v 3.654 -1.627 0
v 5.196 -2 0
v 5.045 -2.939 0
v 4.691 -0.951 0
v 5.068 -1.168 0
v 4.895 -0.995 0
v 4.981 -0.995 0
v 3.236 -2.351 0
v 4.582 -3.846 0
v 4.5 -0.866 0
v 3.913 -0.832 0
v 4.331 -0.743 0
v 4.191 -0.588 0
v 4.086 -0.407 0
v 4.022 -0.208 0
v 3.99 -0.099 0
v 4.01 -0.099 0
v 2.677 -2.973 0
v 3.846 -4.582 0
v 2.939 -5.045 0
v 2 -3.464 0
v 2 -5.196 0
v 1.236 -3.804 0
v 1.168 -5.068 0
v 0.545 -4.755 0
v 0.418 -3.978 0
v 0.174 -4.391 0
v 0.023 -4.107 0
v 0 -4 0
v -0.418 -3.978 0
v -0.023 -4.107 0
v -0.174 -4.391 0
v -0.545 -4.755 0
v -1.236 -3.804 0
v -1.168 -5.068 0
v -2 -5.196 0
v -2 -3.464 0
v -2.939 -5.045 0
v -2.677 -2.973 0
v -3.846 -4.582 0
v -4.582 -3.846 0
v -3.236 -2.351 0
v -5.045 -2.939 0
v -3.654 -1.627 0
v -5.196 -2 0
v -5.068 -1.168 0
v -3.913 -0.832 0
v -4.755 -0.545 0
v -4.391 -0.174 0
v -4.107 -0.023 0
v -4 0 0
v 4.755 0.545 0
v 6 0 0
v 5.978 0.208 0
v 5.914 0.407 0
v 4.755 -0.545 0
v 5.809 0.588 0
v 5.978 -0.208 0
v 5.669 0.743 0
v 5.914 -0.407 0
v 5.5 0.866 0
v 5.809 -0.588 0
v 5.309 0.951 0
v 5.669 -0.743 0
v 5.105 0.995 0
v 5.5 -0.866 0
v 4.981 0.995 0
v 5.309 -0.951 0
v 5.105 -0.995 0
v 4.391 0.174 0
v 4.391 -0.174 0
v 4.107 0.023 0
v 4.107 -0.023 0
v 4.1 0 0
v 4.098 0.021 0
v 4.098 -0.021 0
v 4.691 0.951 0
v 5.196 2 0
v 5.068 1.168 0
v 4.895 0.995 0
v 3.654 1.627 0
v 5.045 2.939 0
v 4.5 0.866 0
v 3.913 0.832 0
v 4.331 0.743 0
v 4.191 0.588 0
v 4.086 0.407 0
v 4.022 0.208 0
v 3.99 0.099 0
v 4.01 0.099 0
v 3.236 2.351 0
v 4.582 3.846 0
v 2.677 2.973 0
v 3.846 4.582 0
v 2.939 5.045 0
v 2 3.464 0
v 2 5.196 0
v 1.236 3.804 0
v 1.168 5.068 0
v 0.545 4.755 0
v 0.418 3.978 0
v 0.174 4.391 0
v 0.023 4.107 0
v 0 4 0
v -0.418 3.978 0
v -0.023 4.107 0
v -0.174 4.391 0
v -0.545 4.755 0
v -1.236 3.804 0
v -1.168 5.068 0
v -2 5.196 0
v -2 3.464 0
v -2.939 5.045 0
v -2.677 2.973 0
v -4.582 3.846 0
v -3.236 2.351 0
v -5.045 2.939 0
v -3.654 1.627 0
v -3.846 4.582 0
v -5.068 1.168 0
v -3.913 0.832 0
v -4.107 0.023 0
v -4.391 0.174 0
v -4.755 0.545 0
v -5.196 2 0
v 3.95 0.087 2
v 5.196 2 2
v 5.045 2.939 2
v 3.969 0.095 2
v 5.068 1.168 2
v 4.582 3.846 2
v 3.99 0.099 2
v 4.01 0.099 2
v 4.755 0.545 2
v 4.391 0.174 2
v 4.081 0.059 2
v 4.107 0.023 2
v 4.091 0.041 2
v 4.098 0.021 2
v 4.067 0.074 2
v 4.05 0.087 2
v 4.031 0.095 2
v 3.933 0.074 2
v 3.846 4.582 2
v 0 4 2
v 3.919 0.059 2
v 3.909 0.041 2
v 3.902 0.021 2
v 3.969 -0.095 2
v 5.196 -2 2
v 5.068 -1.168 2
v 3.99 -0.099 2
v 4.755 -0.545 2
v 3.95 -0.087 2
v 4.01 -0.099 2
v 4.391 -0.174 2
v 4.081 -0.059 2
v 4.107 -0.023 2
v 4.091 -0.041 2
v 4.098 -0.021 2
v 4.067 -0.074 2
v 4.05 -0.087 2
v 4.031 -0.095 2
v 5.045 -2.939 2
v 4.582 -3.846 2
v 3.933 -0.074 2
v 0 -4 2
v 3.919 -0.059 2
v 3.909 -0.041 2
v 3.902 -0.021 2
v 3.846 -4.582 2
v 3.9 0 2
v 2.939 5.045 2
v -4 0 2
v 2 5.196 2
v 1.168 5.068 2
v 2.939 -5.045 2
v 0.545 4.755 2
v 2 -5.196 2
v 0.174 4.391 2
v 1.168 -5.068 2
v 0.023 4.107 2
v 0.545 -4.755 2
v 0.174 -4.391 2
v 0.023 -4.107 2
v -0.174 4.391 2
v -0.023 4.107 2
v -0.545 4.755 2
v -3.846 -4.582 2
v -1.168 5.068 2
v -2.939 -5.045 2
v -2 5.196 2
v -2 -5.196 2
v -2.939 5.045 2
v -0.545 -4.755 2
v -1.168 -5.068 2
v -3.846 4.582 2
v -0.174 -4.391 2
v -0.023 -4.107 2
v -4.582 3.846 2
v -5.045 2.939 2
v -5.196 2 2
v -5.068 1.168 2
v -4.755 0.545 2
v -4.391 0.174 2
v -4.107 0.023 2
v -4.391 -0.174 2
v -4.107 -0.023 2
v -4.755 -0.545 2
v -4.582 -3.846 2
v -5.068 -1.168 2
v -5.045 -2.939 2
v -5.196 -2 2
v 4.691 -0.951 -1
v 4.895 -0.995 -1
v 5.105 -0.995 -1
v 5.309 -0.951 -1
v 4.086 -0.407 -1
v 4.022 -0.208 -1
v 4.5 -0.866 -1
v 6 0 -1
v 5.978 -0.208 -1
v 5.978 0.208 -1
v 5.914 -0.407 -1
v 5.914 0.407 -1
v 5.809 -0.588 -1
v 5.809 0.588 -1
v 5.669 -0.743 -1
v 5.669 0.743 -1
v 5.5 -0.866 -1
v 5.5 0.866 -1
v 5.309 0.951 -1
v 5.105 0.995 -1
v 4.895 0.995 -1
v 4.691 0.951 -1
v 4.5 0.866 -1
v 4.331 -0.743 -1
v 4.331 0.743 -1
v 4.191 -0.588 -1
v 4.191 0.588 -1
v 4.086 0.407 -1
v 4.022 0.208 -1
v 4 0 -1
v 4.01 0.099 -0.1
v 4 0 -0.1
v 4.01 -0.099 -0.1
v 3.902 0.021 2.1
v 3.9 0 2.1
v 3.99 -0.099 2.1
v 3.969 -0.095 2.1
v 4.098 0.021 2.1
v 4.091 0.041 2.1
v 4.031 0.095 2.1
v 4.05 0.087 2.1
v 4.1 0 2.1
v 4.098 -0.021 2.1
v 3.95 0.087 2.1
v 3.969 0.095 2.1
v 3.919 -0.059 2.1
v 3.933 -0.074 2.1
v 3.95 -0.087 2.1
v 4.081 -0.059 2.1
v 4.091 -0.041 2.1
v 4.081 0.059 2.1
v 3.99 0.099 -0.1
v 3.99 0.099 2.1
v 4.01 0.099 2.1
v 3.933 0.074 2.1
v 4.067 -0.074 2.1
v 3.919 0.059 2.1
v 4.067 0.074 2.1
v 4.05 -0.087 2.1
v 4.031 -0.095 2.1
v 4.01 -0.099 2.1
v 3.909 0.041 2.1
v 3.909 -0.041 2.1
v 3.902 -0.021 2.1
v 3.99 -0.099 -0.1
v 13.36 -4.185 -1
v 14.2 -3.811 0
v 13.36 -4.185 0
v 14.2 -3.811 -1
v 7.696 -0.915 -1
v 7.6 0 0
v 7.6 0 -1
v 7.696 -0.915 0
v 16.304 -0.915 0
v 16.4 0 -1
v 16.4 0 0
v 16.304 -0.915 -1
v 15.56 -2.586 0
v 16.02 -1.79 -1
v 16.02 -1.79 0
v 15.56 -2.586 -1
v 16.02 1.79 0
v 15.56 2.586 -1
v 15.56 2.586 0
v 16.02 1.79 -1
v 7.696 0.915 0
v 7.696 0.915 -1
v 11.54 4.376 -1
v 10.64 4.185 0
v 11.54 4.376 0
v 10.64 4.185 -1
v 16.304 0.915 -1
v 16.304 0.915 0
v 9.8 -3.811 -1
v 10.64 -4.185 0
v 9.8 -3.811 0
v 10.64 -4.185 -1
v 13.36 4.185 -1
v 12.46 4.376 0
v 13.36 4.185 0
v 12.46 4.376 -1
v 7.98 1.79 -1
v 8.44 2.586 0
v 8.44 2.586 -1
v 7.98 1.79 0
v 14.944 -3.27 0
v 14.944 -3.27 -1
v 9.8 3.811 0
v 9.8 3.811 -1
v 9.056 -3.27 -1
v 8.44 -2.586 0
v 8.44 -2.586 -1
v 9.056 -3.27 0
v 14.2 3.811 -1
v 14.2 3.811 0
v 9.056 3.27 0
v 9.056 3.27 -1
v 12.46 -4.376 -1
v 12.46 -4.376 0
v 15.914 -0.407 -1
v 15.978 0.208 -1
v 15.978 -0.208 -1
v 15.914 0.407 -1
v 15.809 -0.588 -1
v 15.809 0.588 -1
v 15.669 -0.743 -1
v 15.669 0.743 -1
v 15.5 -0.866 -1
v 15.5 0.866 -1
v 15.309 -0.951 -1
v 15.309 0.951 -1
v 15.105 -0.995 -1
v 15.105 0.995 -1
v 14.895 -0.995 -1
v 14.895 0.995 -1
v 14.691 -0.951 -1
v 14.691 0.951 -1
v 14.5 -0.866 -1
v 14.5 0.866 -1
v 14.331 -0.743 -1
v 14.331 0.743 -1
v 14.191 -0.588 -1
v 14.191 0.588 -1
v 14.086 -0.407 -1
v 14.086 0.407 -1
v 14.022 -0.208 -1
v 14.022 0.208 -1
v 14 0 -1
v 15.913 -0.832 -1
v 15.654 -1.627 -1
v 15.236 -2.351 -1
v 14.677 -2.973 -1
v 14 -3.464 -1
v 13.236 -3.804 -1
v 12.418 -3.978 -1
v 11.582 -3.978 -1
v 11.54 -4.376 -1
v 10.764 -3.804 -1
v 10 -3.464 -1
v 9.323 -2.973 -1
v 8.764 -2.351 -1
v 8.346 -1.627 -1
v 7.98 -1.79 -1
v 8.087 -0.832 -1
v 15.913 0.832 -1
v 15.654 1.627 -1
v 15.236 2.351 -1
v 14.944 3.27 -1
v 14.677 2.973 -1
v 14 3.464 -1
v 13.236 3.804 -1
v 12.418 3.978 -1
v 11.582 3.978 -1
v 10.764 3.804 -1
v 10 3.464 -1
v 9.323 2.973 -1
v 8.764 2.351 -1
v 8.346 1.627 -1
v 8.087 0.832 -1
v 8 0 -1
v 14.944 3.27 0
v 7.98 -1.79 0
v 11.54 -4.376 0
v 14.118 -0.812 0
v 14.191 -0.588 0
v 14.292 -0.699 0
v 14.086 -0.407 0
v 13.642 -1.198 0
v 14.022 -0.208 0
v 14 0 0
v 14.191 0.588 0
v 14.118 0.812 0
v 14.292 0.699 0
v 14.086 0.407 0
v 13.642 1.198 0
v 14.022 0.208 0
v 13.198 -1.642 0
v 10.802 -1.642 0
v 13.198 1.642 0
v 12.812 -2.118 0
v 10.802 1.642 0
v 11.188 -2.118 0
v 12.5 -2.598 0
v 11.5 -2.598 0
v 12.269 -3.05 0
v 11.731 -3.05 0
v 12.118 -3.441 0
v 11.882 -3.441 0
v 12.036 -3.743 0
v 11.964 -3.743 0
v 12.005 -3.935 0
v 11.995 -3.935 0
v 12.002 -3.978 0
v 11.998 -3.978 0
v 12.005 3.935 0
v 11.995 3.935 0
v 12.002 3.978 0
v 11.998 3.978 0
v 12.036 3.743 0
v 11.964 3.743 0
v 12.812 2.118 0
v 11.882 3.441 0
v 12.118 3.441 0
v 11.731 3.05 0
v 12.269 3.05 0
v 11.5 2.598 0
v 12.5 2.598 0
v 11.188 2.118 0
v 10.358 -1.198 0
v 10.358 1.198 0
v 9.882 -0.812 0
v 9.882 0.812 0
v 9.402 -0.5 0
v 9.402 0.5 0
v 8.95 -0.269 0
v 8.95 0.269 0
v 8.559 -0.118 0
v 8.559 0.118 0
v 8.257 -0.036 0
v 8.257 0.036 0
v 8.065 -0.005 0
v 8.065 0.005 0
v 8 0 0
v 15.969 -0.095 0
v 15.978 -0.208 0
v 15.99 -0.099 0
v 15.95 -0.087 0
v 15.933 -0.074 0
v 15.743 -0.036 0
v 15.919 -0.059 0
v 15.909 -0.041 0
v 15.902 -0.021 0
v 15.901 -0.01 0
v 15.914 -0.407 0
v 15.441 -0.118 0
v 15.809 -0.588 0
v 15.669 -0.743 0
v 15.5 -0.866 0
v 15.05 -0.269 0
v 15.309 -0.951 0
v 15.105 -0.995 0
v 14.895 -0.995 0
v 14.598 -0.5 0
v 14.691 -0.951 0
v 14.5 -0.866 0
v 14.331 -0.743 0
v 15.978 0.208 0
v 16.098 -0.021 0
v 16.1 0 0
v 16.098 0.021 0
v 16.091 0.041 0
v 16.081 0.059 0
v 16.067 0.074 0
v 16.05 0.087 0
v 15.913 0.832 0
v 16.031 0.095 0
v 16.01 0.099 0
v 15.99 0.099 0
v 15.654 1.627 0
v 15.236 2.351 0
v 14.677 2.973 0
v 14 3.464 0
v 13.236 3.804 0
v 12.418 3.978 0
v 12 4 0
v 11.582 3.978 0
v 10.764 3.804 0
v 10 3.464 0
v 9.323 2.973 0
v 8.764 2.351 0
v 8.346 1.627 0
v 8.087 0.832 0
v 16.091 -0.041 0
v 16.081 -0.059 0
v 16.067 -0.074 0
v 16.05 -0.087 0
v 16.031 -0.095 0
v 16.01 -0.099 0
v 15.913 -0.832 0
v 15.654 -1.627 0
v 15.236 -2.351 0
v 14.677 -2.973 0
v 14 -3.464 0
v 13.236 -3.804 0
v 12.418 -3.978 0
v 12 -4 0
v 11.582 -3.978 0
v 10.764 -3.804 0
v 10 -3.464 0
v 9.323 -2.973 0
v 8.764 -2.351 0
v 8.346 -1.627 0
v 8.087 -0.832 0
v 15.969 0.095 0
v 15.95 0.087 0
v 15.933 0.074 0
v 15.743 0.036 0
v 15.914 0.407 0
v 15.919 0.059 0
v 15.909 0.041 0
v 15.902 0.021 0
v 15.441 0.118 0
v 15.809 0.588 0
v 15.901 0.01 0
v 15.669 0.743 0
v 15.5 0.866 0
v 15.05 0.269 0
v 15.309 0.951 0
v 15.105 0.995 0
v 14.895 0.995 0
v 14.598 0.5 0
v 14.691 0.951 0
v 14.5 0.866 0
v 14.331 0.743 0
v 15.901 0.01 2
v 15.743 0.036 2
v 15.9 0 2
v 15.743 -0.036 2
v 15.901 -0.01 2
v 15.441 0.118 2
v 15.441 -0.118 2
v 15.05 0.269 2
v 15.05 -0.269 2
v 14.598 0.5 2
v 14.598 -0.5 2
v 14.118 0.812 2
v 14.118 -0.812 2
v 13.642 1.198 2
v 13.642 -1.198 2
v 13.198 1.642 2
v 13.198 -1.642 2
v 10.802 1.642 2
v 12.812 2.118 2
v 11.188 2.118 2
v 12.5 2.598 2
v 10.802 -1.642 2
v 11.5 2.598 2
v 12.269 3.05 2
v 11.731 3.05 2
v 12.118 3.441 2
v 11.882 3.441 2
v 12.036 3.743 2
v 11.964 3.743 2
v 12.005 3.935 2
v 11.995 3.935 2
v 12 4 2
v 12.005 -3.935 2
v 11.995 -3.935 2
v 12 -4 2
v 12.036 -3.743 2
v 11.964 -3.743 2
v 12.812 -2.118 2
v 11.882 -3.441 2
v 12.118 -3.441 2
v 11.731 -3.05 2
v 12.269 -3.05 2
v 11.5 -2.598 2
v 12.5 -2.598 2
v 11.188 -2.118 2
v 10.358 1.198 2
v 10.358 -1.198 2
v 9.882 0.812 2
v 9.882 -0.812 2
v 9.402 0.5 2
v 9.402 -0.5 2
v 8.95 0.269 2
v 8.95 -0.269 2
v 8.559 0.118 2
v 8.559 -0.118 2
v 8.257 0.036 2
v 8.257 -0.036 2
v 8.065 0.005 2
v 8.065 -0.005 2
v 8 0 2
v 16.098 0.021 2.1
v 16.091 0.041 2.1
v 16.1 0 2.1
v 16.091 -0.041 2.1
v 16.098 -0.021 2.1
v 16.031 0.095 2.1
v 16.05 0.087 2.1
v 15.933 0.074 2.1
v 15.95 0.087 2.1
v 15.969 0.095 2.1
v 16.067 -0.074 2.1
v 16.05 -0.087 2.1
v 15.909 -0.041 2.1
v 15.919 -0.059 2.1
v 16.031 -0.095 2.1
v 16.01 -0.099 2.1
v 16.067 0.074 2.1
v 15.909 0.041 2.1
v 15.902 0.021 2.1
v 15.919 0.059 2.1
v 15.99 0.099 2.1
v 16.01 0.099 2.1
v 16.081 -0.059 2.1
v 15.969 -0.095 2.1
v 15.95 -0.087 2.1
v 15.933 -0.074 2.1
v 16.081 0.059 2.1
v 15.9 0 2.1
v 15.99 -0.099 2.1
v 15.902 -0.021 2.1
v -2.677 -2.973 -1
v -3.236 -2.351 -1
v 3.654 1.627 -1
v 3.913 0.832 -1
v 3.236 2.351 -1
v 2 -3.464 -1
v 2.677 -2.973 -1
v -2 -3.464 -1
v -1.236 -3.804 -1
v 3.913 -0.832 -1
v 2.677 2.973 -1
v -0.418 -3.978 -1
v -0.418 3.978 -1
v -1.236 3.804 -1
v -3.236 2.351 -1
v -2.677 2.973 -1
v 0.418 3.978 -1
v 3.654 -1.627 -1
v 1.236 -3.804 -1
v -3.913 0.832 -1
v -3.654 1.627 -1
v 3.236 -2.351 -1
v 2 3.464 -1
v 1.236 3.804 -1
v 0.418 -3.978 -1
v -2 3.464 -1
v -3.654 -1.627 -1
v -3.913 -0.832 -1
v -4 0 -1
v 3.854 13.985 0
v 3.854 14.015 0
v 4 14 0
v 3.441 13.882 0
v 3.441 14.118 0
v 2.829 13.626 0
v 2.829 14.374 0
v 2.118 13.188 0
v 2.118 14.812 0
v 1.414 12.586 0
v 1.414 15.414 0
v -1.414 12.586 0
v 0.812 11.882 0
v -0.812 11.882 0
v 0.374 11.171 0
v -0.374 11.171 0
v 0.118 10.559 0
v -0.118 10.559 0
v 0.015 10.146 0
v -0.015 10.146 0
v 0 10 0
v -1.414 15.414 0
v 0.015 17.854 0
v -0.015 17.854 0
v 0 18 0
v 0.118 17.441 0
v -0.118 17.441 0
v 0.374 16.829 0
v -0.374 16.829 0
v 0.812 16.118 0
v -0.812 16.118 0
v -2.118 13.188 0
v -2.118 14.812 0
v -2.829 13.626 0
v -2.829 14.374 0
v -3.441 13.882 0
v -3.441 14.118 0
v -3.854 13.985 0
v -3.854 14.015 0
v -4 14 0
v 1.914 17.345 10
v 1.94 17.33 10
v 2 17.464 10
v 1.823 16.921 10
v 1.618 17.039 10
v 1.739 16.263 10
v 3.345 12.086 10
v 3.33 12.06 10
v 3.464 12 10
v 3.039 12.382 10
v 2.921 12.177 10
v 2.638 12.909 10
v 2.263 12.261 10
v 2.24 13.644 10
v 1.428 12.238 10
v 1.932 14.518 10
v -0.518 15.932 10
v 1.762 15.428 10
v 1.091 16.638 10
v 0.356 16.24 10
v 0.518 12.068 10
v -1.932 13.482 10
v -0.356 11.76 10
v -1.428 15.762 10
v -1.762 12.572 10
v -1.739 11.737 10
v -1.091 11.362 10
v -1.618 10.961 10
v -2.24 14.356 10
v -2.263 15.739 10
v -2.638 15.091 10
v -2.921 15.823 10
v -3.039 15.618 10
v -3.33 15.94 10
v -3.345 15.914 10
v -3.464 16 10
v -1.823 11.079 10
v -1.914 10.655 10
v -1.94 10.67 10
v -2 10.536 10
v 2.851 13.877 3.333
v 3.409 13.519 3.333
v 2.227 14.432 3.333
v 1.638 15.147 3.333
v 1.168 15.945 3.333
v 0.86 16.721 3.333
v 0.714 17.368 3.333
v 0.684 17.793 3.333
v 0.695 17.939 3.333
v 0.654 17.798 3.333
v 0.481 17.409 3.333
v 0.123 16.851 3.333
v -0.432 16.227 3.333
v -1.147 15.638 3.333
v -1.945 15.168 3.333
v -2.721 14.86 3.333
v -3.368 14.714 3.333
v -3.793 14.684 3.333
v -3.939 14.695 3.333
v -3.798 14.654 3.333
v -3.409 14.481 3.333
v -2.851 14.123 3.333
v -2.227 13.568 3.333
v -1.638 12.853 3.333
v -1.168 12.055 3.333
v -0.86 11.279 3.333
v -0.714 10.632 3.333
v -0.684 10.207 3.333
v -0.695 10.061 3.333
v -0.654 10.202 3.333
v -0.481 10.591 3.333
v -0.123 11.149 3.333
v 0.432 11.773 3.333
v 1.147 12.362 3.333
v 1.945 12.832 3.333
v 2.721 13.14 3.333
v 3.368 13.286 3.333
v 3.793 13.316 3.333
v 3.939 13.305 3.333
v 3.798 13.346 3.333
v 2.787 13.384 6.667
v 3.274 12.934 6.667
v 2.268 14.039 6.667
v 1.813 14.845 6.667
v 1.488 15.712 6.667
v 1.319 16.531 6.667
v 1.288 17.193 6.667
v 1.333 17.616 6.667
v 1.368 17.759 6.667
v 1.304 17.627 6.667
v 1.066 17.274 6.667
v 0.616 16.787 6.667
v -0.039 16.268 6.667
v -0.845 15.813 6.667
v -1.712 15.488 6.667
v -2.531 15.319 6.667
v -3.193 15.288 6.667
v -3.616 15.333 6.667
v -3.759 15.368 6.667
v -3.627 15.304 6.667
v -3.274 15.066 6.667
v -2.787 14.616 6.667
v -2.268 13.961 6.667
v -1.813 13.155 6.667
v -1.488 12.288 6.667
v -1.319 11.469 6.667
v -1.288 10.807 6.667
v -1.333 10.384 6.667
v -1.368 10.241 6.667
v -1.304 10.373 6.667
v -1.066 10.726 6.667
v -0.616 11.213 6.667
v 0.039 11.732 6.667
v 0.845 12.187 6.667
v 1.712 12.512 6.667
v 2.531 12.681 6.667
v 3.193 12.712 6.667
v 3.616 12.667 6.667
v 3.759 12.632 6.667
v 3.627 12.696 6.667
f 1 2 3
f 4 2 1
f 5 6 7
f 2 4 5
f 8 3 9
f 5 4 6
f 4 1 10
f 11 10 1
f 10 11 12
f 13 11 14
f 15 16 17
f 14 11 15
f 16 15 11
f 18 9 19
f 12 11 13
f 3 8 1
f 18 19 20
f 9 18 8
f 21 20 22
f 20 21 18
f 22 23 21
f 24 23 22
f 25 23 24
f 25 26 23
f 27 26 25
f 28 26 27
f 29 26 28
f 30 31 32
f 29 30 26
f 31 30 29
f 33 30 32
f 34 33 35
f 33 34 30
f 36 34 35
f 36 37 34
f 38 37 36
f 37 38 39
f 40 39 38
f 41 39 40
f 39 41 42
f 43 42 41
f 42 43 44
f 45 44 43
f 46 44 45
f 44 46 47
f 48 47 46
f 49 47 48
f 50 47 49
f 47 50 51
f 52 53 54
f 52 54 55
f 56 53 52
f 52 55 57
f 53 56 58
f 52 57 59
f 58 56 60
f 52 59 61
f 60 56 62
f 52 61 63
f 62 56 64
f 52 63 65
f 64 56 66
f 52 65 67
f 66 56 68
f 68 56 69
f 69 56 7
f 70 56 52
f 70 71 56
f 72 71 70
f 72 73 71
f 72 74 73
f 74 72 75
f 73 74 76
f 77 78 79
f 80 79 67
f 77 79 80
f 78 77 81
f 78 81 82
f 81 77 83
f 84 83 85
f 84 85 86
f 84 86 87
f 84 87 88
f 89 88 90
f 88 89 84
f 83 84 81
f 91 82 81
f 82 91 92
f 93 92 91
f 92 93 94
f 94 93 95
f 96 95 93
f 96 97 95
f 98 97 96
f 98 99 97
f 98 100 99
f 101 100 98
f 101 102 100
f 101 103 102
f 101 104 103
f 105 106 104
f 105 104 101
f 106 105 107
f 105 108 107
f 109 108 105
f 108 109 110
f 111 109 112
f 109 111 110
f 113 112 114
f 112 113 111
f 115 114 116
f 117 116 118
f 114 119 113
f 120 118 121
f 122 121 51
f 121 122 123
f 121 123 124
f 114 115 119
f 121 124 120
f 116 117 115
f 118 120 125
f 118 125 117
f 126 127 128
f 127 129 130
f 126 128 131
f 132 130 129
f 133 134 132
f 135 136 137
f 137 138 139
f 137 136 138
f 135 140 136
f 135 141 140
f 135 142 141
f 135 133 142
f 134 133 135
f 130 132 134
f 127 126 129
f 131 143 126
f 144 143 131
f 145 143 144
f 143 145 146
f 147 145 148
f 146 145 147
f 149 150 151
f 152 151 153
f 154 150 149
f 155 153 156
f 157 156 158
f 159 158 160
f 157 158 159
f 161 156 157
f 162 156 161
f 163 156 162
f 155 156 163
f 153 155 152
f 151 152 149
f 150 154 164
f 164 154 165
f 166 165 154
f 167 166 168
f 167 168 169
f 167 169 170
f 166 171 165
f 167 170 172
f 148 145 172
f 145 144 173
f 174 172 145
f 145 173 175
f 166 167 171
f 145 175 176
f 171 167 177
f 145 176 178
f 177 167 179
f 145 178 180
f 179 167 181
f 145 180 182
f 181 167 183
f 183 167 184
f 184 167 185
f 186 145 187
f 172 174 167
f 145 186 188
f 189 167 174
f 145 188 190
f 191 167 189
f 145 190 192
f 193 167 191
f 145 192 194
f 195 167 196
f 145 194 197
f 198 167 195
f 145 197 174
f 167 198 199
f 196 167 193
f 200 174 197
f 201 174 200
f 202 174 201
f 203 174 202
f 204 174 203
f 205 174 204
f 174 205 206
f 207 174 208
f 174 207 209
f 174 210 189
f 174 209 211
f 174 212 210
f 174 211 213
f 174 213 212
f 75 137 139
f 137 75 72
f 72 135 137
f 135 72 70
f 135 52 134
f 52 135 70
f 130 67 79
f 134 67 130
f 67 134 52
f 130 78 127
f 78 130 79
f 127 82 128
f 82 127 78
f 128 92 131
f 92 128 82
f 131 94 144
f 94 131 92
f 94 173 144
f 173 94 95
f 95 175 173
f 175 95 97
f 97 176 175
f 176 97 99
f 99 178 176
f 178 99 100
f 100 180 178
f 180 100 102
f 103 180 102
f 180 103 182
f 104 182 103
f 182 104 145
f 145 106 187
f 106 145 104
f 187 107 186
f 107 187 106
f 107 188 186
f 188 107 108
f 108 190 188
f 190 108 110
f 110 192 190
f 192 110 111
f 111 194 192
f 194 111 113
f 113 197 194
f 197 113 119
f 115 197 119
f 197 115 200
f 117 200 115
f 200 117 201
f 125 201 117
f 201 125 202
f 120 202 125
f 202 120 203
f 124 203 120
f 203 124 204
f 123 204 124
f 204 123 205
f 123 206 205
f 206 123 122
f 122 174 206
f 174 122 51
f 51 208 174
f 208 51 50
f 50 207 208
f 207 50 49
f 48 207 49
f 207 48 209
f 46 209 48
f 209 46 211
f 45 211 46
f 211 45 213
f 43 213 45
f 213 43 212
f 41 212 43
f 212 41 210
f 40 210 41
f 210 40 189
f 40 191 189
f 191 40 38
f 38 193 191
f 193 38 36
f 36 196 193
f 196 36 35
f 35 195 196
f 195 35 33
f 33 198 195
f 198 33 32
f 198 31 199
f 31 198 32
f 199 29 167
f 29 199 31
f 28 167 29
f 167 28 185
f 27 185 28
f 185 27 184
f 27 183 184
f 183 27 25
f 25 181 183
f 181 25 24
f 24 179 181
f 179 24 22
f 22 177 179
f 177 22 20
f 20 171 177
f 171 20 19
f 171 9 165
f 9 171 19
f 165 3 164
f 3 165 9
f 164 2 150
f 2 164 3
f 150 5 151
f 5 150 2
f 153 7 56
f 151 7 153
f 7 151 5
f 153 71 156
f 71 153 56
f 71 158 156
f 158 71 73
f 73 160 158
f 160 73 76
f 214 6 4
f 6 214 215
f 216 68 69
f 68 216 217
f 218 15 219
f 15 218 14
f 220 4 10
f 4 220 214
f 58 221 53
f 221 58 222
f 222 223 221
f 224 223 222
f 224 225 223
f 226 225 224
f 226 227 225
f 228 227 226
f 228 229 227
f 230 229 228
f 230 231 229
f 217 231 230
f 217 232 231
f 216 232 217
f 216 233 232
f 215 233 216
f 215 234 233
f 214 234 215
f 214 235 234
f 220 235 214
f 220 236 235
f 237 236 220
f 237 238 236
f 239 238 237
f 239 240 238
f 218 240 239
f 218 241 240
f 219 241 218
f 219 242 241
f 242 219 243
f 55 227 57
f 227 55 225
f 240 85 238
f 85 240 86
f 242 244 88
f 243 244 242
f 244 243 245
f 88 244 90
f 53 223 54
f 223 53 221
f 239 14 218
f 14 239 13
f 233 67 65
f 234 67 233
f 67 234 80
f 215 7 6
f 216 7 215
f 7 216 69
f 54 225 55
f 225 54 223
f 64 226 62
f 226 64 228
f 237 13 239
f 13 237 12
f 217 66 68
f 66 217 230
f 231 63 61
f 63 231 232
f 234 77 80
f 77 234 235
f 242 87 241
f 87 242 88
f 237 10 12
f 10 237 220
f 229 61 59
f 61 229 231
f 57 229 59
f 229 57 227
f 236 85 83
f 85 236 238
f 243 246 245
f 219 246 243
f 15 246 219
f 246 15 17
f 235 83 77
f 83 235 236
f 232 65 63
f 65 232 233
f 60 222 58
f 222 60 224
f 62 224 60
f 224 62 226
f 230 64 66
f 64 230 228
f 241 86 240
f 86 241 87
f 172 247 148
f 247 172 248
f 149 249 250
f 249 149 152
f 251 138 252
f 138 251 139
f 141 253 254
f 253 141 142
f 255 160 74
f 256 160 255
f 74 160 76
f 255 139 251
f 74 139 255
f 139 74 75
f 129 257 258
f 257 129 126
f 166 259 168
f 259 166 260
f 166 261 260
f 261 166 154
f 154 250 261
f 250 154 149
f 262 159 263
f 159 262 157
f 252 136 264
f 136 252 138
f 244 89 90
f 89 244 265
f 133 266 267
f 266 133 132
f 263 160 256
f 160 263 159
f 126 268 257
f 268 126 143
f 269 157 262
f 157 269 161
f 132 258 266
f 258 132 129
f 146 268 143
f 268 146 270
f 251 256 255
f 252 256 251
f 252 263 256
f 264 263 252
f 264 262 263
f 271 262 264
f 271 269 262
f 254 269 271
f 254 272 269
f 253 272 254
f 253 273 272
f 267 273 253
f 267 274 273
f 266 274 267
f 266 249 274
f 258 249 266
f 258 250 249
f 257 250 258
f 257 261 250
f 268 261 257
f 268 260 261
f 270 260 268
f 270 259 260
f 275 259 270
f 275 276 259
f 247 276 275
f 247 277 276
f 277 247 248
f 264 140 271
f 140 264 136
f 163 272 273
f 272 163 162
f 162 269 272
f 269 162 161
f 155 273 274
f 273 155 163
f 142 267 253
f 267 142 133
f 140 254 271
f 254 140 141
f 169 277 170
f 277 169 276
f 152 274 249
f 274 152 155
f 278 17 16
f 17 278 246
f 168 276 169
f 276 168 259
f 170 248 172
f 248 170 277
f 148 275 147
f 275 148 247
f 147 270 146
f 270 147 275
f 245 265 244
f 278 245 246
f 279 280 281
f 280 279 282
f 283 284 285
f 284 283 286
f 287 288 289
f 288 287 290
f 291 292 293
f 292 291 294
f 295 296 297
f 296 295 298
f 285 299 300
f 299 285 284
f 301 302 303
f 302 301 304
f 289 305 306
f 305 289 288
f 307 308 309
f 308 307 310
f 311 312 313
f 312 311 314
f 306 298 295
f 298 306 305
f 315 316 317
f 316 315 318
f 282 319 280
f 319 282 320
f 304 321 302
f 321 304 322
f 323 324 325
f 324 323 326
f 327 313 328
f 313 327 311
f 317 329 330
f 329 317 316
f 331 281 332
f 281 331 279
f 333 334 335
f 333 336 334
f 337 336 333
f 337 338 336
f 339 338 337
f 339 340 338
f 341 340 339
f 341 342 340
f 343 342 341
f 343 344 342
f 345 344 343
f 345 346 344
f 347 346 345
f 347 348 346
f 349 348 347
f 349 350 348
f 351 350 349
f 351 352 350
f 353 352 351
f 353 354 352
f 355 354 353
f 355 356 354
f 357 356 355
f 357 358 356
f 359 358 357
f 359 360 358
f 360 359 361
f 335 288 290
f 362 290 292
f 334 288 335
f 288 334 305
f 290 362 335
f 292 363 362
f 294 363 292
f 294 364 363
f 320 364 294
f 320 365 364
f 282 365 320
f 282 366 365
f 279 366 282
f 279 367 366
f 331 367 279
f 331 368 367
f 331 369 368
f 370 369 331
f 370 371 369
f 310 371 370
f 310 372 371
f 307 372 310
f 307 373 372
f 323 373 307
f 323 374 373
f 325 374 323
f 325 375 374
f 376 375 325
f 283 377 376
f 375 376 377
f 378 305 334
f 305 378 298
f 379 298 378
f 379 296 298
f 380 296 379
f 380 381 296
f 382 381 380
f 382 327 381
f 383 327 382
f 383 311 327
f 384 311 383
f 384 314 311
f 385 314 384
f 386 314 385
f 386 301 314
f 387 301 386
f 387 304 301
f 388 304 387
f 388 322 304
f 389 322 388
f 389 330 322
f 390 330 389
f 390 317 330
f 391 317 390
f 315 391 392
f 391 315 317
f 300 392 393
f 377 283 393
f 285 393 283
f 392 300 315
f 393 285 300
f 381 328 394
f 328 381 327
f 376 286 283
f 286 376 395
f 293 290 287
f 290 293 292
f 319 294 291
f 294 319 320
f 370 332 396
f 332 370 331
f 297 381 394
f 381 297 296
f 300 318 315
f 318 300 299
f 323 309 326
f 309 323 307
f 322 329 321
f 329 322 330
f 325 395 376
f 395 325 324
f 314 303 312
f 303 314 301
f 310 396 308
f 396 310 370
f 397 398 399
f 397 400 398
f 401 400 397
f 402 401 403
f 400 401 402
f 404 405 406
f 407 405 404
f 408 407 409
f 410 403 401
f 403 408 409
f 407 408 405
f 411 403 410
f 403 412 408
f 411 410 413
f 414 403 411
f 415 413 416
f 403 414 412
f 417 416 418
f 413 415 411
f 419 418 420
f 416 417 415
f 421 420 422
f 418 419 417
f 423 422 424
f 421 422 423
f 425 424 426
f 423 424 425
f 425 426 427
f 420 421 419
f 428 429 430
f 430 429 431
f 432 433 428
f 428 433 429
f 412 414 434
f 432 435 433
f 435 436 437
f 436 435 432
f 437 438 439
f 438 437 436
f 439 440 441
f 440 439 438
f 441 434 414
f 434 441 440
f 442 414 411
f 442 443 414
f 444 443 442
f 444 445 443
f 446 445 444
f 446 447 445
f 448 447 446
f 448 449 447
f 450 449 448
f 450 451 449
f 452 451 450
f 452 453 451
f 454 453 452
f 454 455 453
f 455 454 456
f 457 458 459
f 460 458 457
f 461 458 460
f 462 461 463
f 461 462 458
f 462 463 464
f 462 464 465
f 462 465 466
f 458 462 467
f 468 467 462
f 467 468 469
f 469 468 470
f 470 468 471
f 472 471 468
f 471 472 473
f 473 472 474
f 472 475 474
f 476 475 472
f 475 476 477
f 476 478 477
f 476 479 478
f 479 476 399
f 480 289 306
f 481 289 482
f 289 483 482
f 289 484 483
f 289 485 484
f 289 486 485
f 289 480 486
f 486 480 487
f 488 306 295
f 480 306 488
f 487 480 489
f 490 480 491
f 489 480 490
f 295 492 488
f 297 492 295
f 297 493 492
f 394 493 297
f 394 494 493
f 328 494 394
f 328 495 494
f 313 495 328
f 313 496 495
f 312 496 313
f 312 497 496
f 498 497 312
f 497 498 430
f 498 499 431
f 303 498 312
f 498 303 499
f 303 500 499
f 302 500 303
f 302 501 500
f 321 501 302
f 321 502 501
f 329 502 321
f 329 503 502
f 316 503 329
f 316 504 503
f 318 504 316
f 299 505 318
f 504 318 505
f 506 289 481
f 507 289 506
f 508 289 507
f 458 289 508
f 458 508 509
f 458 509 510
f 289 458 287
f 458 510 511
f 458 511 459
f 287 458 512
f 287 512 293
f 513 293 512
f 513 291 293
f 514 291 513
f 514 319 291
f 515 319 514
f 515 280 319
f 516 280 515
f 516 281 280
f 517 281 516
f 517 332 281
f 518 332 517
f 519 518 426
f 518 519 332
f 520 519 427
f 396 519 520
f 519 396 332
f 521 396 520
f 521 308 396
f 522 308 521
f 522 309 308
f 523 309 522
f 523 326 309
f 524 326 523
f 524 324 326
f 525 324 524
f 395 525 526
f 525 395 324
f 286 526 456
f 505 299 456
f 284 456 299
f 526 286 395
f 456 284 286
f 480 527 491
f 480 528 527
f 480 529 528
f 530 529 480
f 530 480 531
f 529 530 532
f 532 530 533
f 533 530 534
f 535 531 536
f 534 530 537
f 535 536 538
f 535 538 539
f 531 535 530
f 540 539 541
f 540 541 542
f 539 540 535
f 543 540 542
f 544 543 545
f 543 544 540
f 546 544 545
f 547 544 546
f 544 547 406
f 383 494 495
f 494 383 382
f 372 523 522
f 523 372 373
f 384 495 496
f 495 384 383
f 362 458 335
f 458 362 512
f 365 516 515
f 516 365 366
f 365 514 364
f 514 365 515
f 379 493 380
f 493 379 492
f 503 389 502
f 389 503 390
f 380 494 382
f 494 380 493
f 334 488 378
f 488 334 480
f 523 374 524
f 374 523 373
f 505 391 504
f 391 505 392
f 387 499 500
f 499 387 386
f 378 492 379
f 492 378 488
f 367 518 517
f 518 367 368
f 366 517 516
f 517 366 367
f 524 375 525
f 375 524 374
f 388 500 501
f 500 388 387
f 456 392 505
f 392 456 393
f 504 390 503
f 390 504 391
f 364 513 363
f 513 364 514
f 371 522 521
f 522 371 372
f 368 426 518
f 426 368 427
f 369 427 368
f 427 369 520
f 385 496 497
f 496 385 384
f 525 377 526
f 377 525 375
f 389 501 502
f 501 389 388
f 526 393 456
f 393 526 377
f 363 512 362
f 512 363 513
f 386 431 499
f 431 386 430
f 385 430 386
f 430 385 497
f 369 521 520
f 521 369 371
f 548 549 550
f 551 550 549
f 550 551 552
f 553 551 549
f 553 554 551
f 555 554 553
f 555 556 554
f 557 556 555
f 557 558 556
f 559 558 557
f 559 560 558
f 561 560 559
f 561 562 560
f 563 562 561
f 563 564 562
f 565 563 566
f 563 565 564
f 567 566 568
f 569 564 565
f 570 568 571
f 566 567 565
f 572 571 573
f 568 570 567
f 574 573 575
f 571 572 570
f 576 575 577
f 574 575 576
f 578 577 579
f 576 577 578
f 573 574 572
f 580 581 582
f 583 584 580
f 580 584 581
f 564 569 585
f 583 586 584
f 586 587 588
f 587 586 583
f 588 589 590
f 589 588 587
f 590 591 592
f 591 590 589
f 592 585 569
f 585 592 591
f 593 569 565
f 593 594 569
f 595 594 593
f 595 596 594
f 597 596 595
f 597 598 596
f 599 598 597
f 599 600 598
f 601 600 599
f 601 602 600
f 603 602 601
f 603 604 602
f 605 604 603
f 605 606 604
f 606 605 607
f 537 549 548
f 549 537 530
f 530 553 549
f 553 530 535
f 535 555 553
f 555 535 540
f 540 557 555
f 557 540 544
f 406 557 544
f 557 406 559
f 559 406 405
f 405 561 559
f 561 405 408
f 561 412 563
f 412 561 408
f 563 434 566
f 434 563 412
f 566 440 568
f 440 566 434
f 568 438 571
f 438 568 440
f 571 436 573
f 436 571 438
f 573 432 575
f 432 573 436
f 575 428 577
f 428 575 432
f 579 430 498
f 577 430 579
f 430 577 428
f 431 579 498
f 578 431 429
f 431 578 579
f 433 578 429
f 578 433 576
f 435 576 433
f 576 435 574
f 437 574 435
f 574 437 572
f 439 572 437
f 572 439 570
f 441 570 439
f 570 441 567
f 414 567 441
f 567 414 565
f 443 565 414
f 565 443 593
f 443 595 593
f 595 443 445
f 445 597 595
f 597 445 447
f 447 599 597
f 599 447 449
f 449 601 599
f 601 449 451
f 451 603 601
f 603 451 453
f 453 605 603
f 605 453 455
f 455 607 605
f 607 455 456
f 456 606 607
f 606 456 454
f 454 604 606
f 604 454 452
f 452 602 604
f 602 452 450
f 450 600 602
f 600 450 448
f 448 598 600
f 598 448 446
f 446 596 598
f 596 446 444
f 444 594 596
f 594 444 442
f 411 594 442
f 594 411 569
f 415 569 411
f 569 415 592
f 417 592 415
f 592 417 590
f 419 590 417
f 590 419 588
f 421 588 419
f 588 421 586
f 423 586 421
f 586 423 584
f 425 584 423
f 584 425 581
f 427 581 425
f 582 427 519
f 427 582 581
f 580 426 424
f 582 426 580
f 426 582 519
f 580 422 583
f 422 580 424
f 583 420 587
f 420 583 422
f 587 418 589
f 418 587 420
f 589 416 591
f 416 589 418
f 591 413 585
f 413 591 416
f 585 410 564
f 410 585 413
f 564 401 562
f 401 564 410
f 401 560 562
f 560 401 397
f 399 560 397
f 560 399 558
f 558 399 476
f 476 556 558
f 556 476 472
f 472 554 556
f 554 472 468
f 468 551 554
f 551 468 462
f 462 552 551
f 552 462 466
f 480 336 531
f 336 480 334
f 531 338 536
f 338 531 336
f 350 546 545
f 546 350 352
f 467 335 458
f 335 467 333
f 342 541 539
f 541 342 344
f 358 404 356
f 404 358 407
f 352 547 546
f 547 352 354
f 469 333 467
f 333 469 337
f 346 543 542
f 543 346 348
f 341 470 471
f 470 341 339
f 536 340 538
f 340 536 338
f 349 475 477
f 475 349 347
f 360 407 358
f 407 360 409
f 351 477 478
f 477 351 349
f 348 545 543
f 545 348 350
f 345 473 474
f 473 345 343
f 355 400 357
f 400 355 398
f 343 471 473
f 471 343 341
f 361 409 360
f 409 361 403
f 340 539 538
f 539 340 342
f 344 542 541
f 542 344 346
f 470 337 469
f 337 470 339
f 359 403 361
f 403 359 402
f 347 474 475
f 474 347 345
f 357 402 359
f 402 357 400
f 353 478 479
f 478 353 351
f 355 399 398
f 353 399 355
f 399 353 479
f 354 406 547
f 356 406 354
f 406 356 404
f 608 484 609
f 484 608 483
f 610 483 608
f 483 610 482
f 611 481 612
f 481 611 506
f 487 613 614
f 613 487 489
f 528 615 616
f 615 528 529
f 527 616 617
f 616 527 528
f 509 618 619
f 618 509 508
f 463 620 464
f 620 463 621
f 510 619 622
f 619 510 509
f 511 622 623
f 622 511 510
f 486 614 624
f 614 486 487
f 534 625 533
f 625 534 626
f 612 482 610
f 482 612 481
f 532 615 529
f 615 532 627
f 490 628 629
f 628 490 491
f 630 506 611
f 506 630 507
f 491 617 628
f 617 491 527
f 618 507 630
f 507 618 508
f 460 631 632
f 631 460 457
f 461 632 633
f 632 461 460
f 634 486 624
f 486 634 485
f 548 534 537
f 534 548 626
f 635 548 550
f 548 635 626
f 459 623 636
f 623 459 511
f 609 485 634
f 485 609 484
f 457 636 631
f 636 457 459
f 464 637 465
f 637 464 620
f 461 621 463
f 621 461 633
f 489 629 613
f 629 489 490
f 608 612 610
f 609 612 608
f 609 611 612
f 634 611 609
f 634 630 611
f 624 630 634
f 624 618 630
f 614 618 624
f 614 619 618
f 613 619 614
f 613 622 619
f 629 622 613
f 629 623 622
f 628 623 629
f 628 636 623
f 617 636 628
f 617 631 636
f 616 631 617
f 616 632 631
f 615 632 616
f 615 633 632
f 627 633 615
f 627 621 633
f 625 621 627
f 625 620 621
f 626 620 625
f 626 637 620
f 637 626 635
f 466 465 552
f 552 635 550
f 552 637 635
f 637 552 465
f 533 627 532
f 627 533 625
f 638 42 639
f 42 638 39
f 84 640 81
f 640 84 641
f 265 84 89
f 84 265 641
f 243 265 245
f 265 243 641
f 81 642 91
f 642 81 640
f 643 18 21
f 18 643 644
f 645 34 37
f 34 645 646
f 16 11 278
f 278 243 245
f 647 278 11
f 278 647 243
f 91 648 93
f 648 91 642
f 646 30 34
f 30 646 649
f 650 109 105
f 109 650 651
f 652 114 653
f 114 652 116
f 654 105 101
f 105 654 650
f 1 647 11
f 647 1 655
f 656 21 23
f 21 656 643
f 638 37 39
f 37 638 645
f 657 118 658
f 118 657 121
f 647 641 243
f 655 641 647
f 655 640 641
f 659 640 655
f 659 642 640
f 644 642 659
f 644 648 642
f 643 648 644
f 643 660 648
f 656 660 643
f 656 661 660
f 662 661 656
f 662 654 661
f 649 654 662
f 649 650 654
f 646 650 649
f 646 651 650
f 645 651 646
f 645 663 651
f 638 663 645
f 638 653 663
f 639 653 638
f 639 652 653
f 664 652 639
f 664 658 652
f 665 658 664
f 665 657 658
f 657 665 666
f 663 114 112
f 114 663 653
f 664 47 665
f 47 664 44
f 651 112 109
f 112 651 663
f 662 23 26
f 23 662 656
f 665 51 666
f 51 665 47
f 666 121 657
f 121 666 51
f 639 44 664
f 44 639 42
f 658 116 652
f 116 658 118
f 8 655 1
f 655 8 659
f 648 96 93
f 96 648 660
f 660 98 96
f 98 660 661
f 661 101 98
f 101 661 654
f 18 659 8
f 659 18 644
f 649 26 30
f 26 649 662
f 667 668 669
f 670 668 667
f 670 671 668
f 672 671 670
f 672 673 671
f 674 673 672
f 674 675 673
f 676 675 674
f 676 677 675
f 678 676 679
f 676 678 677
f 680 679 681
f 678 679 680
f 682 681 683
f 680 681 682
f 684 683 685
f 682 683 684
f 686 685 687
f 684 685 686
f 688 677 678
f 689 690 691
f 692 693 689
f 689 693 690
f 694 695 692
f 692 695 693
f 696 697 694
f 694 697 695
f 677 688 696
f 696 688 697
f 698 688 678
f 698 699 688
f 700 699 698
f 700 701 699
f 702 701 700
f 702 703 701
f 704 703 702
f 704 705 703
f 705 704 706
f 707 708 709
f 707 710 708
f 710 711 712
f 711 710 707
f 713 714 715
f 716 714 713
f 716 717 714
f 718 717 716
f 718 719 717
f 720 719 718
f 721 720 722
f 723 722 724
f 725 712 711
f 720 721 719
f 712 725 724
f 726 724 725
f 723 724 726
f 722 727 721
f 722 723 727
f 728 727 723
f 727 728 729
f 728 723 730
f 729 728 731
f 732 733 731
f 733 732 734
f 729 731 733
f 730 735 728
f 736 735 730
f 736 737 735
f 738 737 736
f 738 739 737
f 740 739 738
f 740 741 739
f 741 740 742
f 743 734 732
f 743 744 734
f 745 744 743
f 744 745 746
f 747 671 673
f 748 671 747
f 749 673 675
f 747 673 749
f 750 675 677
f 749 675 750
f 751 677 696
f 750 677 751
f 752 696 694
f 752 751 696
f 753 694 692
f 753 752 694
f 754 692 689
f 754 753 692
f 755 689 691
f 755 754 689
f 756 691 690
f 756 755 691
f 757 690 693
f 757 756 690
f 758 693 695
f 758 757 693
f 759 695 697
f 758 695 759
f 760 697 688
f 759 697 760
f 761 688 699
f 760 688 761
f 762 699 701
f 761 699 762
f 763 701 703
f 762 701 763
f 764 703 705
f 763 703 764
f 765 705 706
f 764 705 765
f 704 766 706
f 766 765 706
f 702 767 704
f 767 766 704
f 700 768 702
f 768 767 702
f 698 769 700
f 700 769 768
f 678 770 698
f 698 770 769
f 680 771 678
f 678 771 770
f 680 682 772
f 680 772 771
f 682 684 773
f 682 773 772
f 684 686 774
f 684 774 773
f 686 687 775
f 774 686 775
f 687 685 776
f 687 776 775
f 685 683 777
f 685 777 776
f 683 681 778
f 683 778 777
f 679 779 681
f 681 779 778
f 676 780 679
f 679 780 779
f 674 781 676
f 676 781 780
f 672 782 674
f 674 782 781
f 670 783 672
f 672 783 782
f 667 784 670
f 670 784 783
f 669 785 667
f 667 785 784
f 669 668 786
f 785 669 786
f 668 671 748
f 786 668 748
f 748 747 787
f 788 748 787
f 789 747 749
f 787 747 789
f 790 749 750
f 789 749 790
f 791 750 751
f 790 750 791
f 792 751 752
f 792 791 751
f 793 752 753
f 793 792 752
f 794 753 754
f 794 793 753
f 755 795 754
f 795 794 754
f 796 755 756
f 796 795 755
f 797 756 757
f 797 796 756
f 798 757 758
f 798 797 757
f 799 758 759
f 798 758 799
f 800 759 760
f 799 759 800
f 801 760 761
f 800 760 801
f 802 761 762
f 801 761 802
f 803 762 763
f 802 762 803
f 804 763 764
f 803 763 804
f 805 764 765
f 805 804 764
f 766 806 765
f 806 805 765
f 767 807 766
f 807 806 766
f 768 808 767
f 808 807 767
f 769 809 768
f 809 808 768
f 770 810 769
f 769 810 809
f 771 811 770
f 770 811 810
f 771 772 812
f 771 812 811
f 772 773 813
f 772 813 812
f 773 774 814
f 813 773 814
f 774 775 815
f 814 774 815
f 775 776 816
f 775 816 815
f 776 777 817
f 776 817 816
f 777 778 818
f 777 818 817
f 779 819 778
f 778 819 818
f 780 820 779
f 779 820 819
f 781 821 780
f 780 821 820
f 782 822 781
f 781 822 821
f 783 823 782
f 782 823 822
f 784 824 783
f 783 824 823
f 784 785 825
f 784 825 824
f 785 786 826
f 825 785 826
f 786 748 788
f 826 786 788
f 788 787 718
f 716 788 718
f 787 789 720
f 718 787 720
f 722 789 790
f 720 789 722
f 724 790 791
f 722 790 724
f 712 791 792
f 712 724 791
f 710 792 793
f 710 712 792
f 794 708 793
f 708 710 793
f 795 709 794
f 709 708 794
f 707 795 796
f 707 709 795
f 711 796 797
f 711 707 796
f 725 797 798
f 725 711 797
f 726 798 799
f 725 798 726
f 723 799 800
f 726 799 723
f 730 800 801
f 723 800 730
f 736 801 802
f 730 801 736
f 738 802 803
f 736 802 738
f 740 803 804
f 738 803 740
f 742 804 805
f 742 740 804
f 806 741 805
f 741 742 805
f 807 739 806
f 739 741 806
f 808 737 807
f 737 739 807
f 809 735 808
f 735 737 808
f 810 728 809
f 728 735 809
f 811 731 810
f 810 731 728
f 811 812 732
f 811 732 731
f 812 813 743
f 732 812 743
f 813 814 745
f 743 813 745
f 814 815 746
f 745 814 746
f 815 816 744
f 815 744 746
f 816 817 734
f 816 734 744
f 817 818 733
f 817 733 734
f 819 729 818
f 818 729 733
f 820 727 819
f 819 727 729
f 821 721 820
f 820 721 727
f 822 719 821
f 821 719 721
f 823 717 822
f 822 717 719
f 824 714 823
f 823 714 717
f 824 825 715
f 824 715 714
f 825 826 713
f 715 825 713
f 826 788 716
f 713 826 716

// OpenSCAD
//===========================================
//   Public Domain Epi- and Hypo- trochoids in OpenSCAD
//   version 1.0
//   by Matt Moses, 2011, mmoses152@gmail.com
//   http://www.thingiverse.com/thing:8067
//
//   This file is public domain.  Use it for any purpose, including commercial
//   applications.  Attribution would be nice, but is not required.  There is
//   no warranty of any kind, including its correctness, usefulness, or safety.
//
//   An EPITROCHOID is a curve traced by a point 
//   fixed at a distance "d" 
//   to the center of a circle of radius "r"
//   as the circle rolls 
//   outside another circle of radius "R".
//
//   An HYPOTROCHOID is a curve traced by a point 
//   fixed at a distance "d" 
//   to the center of a circle of radius "r"
//   as the circle rolls 
//   inside another circle of radius "R".
//
//   An EPICYCLOID is an epitrochoid with d = r.
//
//   An HYPOCYCLOID is an hypotrochoid with d = r.
//
//   See http://en.wikipedia.org/wiki/Epitrochoid
//   and http://en.wikipedia.org/wiki/Hypotrochoid
// 
//   Beware the polar forms of the equations on Wikipedia...
//   They are correct, but theta is measured to the center of the small disk!!
//===========================================

// There are several different methods for extruding.  The best are probably
// the ones using linear extrude.


//===========================================
//   Demo - draws one of each, plus some little wheels and sticks.
//
//   Fun stuff to try: 
//   Animate, try FPS = 5 and Steps = 200
//   R = 2, r = 1, d = 0.2
//   R = 4, r = 1, d = 1
//   R = 2, r = 1, d = 0.5
//   
//   What happens when you make d > r ??
//   What happens when d < 0 ??
//   What happens when r < 0 ??
//
//===========================================

$fn = 30;

thickness = 2;
R = 4;
r = 1;
d = 1;
n = 60; // number of wedge segments

alpha = 360*$t;

color([0, 0, 1])
translate([0, 0, -0.5])
	cylinder(h = 1, r= R, center = true);

color([0, 1, 0])
epitrochoid(R,r,d,n,thickness);

color([1, 0, 0])
translate([ (R+r)*cos(alpha) , (R+r)*sin(alpha), -0.5]) {
	rotate([0, 0, alpha + R/r*alpha]) {
		cylinder(h = 1, r = r, center = true);
		translate([-d, 0, 1.5]) {
			cylinder(h = 2.2, r = 0.1, center = true);
		}
	}
}


translate([2*(abs(R) + abs(r) + abs(d)), 0, 0]){
color([0, 0, 1])
translate([0, 0, -0.5])
	difference() {
		cylinder(h = 1, r = 1.1*R, center = true);
		cylinder(h = 1.1, r= R, center = true);
	}

color([0, 1, 0])
hypotrochoid(R,r,d,n,thickness);

color([1, 0, 0])
translate([ (R-r)*cos(alpha) , (R-r)*sin(alpha), -0.5]) {
	rotate([0, 0, alpha - R/r*alpha]) {
		cylinder(h = 1, r = r, center = true);
		translate([d, 0, 1.5]) {
			cylinder(h = 2.2, r = 0.1, center = true);
		}
	}
}
}

// This just makes a twisted hypotrochoid
translate([0,14, 0])
hypotrochoidLinear(4, 1, 1, 40, 40, 10, 30);

//   End of Demo Section
//===========================================


//===========================================
// Epitrochoid
//
module epitrochoid(R, r, d, n, thickness) {
	dth = 360/n;
	for ( i = [0:n-1] ) {
			polyhedron(points = [[0,0,0], 
			[(R+r)*cos(dth*i) - d*cos((R+r)/r*dth*i), (R+r)*sin(dth*i) - d*sin((R+r)/r*dth*i), 0], 
			[(R+r)*cos(dth*(i+1)) - d*cos((R+r)/r*dth*(i+1)), (R+r)*sin(dth*(i+1)) - d*sin((R+r)/r*dth*(i+1)), 0], 
			[0,0,thickness], 
			[(R+r)*cos(dth*i) - d*cos((R+r)/r*dth*i), (R+r)*sin(dth*i) - d*sin((R+r)/r*dth*i), thickness], 
			[(R+r)*cos(dth*(i+1)) - d*cos((R+r)/r*dth*(i+1)), (R+r)*sin(dth*(i+1)) - d*sin((R+r)/r*dth*(i+1)), thickness]],
			triangles = [[0, 2, 1], 
			[0, 1,  3], 
			[3, 1, 4], 
			[3, 4, 5], 
			[0, 3, 2], 
			[2, 3, 5],
			[1, 2, 4],
			[2, 5, 4]]);
	}
}
//===========================================


//===========================================
// Hypotrochoid
//
module hypotrochoid(R, r, d, n, thickness) {
	dth = 360/n;
	for ( i = [0:n-1] ) {
			polyhedron(points = [[0,0,0], 
			[(R-r)*cos(dth*i) + d*cos((R-r)/r*dth*i), (R-r)*sin(dth*i) - d*sin((R-r)/r*dth*i), 0], 
			[(R-r)*cos(dth*(i+1)) + d*cos((R-r)/r*dth*(i+1)), (R-r)*sin(dth*(i+1)) - d*sin((R-r)/r*dth*(i+1)), 0], 
			[0,0,thickness], 
			[(R-r)*cos(dth*i) + d*cos((R-r)/r*dth*i), (R-r)*sin(dth*i) - d*sin((R-r)/r*dth*i), thickness], 
			[(R-r)*cos(dth*(i+1)) + d*cos((R-r)/r*dth*(i+1)), (R-r)*sin(dth*(i+1)) - d*sin((R-r)/r*dth*(i+1)), thickness]],
			triangles = [[0, 2, 1], 
			[0, 1,  3], 
			[3, 1, 4], 
			[3, 4, 5], 
			[0, 3, 2], 
			[2, 3, 5],
			[1, 2, 4],
			[2, 5, 4]]);
	}
}
//===========================================


//===========================================
// Epitrochoid Wedge with Bore
//
module epitrochoidWBore(R, r, d, n, p, thickness, rb) {
	dth = 360/n;
	union() {
	for ( i = [0:p-1] ) {
			polyhedron(points = [[rb*cos(dth*i), rb*sin(dth*i),0], 
			[(R+r)*cos(dth*i) - d*cos((R+r)/r*dth*i), (R+r)*sin(dth*i) - d*sin((R+r)/r*dth*i), 0], 
			[(R+r)*cos(dth*(i+1)) - d*cos((R+r)/r*dth*(i+1)), (R+r)*sin(dth*(i+1)) - d*sin((R+r)/r*dth*(i+1)), 0], 
			[rb*cos(dth*(i+1)), rb*sin(dth*(i+1)), 0], 
			[rb*cos(dth*i), rb*sin(dth*i), thickness],
			[(R+r)*cos(dth*i) - d*cos((R+r)/r*dth*i), (R+r)*sin(dth*i) - d*sin((R+r)/r*dth*i), thickness], 
			[(R+r)*cos(dth*(i+1)) - d*cos((R+r)/r*dth*(i+1)), (R+r)*sin(dth*(i+1)) - d*sin((R+r)/r*dth*(i+1)), thickness],
			[rb*cos(dth*(i+1)), rb*sin(dth*(i+1)), thickness]],
			triangles = [[0, 1, 4], [4, 1, 5],
			[1, 2, 5], [5, 2, 6], 
			[2, 3, 7], [7, 6, 2], 
			[3, 0, 4], [4, 7, 3], 
			[4, 5, 7], [7, 5, 6], 
			[0, 3, 1], [1, 3, 2]]); 
	}
	}
}
//===========================================


//===========================================
// Epitrochoid Wedge with Bore, Linear Extrude
//
module epitrochoidWBoreLinear(R, r, d, n, p, thickness, rb, twist) {
	dth = 360/n;
	linear_extrude(height = thickness, convexity = 10, twist = twist) {
	union() {
	for ( i = [0:p-1] ) {
			polygon(points = [[rb*cos(dth*i), rb*sin(dth*i)], 
			[(R+r)*cos(dth*i) - d*cos((R+r)/r*dth*i), (R+r)*sin(dth*i) - d*sin((R+r)/r*dth*i)], 
			[(R+r)*cos(dth*(i+1)) - d*cos((R+r)/r*dth*(i+1)), (R+r)*sin(dth*(i+1)) - d*sin((R+r)/r*dth*(i+1))], 
			[rb*cos(dth*(i+1)), rb*sin(dth*(i+1))]],
			paths = [[0, 1, 2, 3]], convexity = 10); 
	}
	}
	}
}
//===========================================


//===========================================
// Epitrochoid Wedge, Linear Extrude
//
module epitrochoidLinear(R, r, d, n, p, thickness, twist) {
	dth = 360/n;
	linear_extrude(height = thickness, convexity = 10, twist = twist) {
	union() {
	for ( i = [0:p-1] ) {
			polygon(points = [[0, 0], 
			[(R+r)*cos(dth*i) - d*cos((R+r)/r*dth*i), (R+r)*sin(dth*i) - d*sin((R+r)/r*dth*i)], 
			[(R+r)*cos(dth*(i+1)) - d*cos((R+r)/r*dth*(i+1)), (R+r)*sin(dth*(i+1)) - d*sin((R+r)/r*dth*(i+1))]], 
			paths = [[0, 1, 2]], convexity = 10); 
	}
	}
	}
}
//===========================================


//===========================================
// Hypotrochoid Wedge with Bore
//
module hypotrochoidWBore(R, r, d, n, p, thickness, rb) {
	dth = 360/n;
	union() {
	for ( i = [0:p-1] ) {
			polyhedron(points = [[rb*cos(dth*i), rb*sin(dth*i),0], 
			[(R-r)*cos(dth*i) + d*cos((R-r)/r*dth*i), (R-r)*sin(dth*i) - d*sin((R-r)/r*dth*i), 0], 
			[(R-r)*cos(dth*(i+1)) + d*cos((R-r)/r*dth*(i+1)), (R-r)*sin(dth*(i+1)) - d*sin((R-r)/r*dth*(i+1)), 0], 
			[rb*cos(dth*(i+1)), rb*sin(dth*(i+1)), 0], 
			[rb*cos(dth*i), rb*sin(dth*i), thickness],
			[(R-r)*cos(dth*i) + d*cos((R-r)/r*dth*i), (R-r)*sin(dth*i) - d*sin((R-r)/r*dth*i), thickness], 
			[(R-r)*cos(dth*(i+1)) + d*cos((R-r)/r*dth*(i+1)), (R-r)*sin(dth*(i+1)) - d*sin((R-r)/r*dth*(i+1)), thickness],
			[rb*cos(dth*(i+1)), rb*sin(dth*(i+1)), thickness]],
			triangles = [[0, 1, 4], [4, 1, 5],
			[1, 2, 5], [5, 2, 6], 
			[2, 3, 7], [7, 6, 2], 
			[3, 0, 4], [4, 7, 3], 
			[4, 5, 7], [7, 5, 6], 
			[0, 3, 1], [1, 3, 2]]); 
	}
	}
}
//===========================================


//===========================================
// Hypotrochoid Wedge with Bore, Linear Extrude
//
module hypotrochoidWBoreLinear(R, r, d, n, p, thickness, rb, twist) {
	dth = 360/n;
	linear_extrude(height = thickness, convexity = 10, twist = twist) {
	union() {
	for ( i = [0:p-1] ) {
			polygon(points = [[rb*cos(dth*i), rb*sin(dth*i)], 
			[(R-r)*cos(dth*i) + d*cos((R-r)/r*dth*i), (R-r)*sin(dth*i) - d*sin((R-r)/r*dth*i)], 
			[(R-r)*cos(dth*(i+1)) + d*cos((R-r)/r*dth*(i+1)), (R-r)*sin(dth*(i+1)) - d*sin((R-r)/r*dth*(i+1))], 
			[rb*cos(dth*(i+1)), rb*sin(dth*(i+1))]], 
			paths = [[0, 1, 2, 3]], convexity = 10); 
	}
	}
	}
}
//===========================================


//===========================================
// Hypotrochoid Wedge, Linear Extrude
//
module hypotrochoidLinear(R, r, d, n, p, thickness, twist) {
	dth = 360/n;
	linear_extrude(height = thickness, convexity = 10, twist = twist) {
	union() {
	for ( i = [0:p-1] ) {
			polygon(points = [[0, 0], 
			[(R-r)*cos(dth*i) + d*cos((R-r)/r*dth*i), (R-r)*sin(dth*i) - d*sin((R-r)/r*dth*i)], 
			[(R-r)*cos(dth*(i+1)) + d*cos((R-r)/r*dth*(i+1)), (R-r)*sin(dth*(i+1)) - d*sin((R-r)/r*dth*(i+1))]],
			paths = [[0, 1, 2]], convexity = 10); 
	}
	}
	}
}
//=========================================== 
